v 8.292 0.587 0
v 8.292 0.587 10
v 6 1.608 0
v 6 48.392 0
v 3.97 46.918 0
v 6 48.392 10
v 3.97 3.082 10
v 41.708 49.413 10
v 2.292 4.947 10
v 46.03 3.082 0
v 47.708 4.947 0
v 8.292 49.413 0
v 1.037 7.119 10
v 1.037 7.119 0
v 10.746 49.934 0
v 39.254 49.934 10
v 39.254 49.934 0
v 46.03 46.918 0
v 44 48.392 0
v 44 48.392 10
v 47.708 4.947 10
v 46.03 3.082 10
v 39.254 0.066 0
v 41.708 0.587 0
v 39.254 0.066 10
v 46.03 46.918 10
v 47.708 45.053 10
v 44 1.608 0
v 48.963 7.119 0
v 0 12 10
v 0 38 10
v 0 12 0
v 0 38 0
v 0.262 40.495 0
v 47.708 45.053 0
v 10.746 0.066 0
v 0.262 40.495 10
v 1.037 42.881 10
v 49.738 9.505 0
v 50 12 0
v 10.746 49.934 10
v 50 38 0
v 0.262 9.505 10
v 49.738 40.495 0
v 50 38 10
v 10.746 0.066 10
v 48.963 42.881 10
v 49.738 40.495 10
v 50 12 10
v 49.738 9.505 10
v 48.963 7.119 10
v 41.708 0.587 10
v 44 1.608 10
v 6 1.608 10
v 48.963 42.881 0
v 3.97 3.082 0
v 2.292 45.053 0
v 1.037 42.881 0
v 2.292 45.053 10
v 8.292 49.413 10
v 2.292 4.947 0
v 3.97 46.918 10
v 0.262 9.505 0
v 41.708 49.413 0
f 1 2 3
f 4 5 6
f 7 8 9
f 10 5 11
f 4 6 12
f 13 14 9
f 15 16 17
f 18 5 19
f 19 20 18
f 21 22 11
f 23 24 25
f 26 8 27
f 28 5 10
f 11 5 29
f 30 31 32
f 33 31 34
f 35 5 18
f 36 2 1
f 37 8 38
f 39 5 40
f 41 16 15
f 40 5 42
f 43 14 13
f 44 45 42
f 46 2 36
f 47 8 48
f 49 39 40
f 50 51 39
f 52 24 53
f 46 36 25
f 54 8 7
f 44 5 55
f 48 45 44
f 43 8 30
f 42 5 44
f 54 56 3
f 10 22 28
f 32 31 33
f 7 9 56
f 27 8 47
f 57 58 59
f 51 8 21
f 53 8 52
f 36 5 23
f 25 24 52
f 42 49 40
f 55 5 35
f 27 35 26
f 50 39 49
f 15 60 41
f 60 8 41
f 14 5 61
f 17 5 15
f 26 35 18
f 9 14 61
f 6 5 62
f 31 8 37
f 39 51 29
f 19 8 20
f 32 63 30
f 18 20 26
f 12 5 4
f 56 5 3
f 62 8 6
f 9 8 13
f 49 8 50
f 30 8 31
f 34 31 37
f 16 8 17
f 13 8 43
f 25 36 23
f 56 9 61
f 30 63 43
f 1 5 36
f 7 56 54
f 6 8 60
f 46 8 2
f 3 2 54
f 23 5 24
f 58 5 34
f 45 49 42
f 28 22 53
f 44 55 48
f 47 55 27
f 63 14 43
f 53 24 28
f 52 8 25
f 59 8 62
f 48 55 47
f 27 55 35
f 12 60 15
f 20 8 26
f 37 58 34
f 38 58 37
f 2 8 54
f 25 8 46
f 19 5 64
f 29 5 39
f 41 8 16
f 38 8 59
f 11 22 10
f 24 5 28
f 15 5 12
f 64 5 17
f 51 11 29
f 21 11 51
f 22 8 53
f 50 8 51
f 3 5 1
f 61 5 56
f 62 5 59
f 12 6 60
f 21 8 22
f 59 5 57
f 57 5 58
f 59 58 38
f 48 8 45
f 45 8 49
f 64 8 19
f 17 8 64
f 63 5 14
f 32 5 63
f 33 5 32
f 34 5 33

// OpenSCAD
module cuboArredondado(xdim,ydim,zdim,rdim){
    hull(){
        translate([rdim,rdim])cylinder(r=rdim,h=zdim);
        translate([xdim-rdim,rdim,0])cylinder(r=rdim,h=zdim);
        translate([rdim,ydim-rdim])cylinder(r=rdim,h=zdim);
        translate([xdim-rdim,ydim-rdim,0])cylinder(r=rdim,h=zdim);
    }
}

cuboArredondado(50,50,10,12);
